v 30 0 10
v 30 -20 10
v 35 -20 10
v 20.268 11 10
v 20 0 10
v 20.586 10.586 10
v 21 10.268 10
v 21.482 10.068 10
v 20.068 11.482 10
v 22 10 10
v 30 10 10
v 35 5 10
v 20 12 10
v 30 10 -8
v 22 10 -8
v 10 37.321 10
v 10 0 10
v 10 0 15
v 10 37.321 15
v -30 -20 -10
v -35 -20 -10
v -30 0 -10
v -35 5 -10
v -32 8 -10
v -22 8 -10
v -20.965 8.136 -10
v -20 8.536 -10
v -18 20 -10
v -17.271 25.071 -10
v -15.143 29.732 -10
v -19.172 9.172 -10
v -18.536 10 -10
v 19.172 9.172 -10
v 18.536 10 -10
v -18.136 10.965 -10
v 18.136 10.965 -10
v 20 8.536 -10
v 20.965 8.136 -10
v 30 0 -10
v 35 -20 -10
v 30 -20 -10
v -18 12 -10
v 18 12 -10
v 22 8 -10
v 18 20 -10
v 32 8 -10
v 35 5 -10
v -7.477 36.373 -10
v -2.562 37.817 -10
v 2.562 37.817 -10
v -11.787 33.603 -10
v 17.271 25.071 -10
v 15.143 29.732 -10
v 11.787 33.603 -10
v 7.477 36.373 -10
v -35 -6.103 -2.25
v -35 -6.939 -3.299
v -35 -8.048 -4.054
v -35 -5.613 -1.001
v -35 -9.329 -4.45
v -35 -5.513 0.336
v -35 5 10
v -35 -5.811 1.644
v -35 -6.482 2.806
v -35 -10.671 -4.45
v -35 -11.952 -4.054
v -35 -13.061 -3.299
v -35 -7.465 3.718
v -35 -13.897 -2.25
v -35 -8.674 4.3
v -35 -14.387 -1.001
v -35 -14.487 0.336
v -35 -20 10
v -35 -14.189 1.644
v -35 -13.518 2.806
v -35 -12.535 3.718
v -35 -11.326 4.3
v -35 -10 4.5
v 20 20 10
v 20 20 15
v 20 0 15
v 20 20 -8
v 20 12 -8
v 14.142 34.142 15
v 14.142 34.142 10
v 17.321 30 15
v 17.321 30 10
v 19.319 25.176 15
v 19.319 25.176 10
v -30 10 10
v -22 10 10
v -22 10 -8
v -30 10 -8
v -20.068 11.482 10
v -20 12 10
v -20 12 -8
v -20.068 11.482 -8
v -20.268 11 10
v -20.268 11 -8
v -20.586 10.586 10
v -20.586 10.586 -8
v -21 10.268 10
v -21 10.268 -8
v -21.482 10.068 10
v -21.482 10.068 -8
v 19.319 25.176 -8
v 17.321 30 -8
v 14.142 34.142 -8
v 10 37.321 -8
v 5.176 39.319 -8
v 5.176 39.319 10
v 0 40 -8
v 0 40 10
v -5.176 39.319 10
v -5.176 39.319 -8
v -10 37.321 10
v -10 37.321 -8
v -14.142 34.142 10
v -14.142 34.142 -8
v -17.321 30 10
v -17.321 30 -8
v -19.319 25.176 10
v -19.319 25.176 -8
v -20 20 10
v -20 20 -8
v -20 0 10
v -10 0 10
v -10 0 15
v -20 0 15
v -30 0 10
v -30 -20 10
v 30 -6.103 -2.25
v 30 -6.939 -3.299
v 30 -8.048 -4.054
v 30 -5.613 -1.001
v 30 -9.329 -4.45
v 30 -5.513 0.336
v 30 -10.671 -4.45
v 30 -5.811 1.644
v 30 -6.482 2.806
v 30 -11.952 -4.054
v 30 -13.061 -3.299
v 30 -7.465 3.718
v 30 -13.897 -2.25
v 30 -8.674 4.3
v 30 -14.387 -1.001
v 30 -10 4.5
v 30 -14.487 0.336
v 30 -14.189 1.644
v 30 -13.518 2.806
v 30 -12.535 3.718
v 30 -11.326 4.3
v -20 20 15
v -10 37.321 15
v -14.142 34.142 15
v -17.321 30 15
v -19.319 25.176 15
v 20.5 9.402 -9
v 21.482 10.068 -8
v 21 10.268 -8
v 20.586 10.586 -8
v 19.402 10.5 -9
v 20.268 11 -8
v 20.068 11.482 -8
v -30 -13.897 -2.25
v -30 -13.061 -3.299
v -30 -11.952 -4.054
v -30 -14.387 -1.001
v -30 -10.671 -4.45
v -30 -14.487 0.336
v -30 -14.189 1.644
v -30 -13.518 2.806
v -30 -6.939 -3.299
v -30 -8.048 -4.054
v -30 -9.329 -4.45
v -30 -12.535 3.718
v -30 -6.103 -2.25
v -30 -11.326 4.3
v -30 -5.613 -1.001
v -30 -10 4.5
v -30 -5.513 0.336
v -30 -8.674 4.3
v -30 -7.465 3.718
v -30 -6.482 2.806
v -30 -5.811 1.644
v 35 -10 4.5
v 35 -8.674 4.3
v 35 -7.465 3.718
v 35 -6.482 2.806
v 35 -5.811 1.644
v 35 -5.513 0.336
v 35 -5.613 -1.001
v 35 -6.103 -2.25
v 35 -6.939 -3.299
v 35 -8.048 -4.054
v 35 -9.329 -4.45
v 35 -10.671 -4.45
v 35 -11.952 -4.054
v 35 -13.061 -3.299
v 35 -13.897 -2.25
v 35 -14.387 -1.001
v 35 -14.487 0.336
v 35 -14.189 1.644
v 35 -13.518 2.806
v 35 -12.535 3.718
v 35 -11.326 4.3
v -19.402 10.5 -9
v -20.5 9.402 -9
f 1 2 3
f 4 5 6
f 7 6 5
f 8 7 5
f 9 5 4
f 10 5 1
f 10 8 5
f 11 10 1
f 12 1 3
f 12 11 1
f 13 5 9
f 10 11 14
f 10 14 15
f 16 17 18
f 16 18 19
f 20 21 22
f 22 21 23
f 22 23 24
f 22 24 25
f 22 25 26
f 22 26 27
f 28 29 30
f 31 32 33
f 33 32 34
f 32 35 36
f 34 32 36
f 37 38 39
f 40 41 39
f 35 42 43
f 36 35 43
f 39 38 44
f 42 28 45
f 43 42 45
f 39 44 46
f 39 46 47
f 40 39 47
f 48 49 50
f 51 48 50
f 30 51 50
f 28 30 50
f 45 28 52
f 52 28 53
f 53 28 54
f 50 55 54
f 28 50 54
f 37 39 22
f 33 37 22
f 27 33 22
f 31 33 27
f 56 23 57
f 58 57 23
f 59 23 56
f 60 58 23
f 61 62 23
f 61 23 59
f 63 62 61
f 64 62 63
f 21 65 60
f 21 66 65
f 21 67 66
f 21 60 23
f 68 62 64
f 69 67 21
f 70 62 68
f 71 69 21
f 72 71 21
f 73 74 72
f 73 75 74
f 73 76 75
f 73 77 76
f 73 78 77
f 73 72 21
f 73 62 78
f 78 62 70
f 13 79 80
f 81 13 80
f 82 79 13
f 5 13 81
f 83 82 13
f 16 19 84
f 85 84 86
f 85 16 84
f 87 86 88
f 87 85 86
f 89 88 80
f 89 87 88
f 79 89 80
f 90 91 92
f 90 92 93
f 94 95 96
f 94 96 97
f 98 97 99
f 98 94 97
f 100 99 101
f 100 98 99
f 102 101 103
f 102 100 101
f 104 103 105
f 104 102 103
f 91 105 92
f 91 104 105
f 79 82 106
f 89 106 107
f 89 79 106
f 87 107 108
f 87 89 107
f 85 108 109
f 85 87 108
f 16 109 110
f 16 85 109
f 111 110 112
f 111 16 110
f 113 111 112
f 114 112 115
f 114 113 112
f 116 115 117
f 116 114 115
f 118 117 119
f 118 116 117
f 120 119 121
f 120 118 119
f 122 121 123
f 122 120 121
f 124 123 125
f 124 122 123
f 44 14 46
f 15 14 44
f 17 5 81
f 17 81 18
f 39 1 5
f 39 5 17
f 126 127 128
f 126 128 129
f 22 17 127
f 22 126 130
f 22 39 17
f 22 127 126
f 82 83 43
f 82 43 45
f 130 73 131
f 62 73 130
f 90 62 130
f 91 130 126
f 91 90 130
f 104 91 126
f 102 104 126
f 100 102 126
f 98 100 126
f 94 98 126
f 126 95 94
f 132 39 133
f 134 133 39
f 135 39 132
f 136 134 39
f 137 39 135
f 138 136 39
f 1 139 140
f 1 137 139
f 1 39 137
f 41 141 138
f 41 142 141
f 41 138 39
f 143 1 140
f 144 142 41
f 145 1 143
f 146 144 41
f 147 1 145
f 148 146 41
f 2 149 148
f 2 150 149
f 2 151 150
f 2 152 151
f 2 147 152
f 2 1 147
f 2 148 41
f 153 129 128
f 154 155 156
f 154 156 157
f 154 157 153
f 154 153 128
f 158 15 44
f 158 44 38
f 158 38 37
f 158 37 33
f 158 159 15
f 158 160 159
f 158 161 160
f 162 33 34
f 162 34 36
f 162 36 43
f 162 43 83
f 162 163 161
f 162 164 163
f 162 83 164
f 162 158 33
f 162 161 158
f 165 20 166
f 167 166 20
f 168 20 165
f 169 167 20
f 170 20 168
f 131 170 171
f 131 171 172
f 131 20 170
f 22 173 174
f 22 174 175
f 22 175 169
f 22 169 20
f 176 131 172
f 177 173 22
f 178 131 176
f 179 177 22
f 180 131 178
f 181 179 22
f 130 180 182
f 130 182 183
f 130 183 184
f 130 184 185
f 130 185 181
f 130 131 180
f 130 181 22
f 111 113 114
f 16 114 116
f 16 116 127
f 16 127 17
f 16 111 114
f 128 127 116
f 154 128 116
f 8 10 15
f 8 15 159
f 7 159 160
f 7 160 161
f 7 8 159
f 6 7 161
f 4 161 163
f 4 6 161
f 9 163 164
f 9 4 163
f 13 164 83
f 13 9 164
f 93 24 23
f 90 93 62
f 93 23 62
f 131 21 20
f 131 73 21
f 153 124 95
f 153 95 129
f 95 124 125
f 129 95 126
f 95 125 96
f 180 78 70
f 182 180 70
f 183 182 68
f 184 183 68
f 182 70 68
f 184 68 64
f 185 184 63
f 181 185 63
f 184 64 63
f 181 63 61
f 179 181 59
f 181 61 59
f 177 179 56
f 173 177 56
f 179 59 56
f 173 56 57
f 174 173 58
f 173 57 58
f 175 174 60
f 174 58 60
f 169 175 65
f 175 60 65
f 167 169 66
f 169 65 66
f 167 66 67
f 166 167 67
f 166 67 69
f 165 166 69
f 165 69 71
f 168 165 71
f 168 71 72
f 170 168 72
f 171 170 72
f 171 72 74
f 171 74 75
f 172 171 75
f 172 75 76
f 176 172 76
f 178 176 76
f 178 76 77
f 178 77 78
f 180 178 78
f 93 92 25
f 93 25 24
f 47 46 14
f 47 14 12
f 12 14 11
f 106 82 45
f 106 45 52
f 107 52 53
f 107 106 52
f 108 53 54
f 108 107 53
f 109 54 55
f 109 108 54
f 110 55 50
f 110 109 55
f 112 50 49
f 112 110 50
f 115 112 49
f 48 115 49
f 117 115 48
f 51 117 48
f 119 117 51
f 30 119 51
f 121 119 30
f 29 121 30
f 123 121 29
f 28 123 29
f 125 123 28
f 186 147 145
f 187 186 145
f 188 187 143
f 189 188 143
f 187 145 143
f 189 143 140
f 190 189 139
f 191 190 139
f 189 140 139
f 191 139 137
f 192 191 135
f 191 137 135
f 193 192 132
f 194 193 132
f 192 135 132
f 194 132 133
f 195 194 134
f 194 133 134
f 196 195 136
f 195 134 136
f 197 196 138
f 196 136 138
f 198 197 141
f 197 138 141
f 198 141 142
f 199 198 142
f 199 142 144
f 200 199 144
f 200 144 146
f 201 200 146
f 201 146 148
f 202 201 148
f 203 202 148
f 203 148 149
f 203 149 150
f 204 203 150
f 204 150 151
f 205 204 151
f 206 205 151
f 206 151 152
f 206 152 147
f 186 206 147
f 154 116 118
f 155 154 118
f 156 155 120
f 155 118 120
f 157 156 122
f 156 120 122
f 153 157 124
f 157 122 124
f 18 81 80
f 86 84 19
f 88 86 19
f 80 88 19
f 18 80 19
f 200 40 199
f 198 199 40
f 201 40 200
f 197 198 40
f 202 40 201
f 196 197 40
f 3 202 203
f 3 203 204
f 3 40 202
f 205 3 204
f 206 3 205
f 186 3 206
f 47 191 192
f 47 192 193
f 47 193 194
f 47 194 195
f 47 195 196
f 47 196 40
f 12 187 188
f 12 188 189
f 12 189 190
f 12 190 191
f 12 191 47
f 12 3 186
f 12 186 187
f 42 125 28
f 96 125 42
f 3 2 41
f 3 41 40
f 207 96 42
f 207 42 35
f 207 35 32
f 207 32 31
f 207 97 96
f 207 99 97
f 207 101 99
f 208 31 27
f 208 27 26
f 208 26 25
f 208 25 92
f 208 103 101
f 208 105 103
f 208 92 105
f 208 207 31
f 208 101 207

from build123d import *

# Parameters (mm, degrees)
EXTRUDE_1_DEPTH     = 10
SKETCH_2_R          = 4.5
CUT_EXTRUDE_1_DEPTH = 71
CHAMFER_3_SIZE      = 5
FILLET_2_R          = 2
CHAMFER_5_SIZE      = 2
EXTRUDE_2_DEPTH     = 5


with BuildPart() as part:
    # 草图1 → 凸台-拉伸1 (new body, symmetric)
    with BuildSketch(Plane.XY):
        with BuildLine():
            Line((-30, 0), (30, 0))
            Line((30, 0), (30, -20))
            Line((30, -20), (35, -20))
            Line((35, -20), (35, 10))
            Line((35, 10), (20, 10))
            Line((20, 10), (20, 20))
            ThreePointArc((20, 20), (0, 40), (-20, 20))
            Line((-20, 20), (-20, 10))
            Line((-20, 10), (-35, 10))
            Line((-35, 10), (-35, -20))
            Line((-35, -20), (-30, -20))
            Line((-30, -20), (-30, 0))
        make_face()
    extrude(amount=EXTRUDE_1_DEPTH, both=True)

    # 草图2 → 切除-拉伸1 (cut, through all)
    with BuildSketch(Plane.ZY.offset(35)):
        with Locations((0, -10)):
            Circle(SKETCH_2_R)
    extrude(amount=-CUT_EXTRUDE_1_DEPTH, mode=Mode.SUBTRACT)

    # 倒角3
    chamfer_3_edges = [part.edges().sort_by_distance(p)[0] for p in [
        (35, 10, 0),
        (-35, 10, 0),
    ]]
    chamfer(chamfer_3_edges, length=CHAMFER_3_SIZE)

    # 圆角2
    fillet_2_edges = [part.edges().sort_by_distance(p)[0] for p in [
        (-20, 10, 0),
        (20, 10, 0),
    ]]
    fillet(fillet_2_edges, radius=FILLET_2_R)

    # 倒角5
    chamfer_5_edges = [part.edges().sort_by_distance(p)[0] for p in [
        (-20, 16, -10),
        (0, 40, -10),
        (26, 10, -10),
        (-26, 10, -10),
        (20, 16, -10),
        (-20.585786438, 10.585786438, -10),
        (20.585786438, 10.585786438, -10),
    ]]
    chamfer(chamfer_5_edges, length=CHAMFER_5_SIZE)

    # 草图3 → 凸台-拉伸2 (add)
    with BuildSketch(Plane.XY.offset(10)):
        with BuildLine():
            Line((20, 0), (10, 0))
            Line((10, 0), (10, 37.320508076))
            ThreePointArc((10, 37.320508076), (17.320508076, 30), (20, 20))
            Line((20, 20), (20, 0))
        make_face()
        with BuildLine():
            Line((-10, 0), (-10, 37.320508076))
            ThreePointArc((-10, 37.320508076), (-17.320508076, 30), (-20, 20))
            Line((-20, 20), (-20, 0))
            Line((-20, 0), (-10, 0))
        make_face()
    extrude(amount=EXTRUDE_2_DEPTH)


solid = part.part
